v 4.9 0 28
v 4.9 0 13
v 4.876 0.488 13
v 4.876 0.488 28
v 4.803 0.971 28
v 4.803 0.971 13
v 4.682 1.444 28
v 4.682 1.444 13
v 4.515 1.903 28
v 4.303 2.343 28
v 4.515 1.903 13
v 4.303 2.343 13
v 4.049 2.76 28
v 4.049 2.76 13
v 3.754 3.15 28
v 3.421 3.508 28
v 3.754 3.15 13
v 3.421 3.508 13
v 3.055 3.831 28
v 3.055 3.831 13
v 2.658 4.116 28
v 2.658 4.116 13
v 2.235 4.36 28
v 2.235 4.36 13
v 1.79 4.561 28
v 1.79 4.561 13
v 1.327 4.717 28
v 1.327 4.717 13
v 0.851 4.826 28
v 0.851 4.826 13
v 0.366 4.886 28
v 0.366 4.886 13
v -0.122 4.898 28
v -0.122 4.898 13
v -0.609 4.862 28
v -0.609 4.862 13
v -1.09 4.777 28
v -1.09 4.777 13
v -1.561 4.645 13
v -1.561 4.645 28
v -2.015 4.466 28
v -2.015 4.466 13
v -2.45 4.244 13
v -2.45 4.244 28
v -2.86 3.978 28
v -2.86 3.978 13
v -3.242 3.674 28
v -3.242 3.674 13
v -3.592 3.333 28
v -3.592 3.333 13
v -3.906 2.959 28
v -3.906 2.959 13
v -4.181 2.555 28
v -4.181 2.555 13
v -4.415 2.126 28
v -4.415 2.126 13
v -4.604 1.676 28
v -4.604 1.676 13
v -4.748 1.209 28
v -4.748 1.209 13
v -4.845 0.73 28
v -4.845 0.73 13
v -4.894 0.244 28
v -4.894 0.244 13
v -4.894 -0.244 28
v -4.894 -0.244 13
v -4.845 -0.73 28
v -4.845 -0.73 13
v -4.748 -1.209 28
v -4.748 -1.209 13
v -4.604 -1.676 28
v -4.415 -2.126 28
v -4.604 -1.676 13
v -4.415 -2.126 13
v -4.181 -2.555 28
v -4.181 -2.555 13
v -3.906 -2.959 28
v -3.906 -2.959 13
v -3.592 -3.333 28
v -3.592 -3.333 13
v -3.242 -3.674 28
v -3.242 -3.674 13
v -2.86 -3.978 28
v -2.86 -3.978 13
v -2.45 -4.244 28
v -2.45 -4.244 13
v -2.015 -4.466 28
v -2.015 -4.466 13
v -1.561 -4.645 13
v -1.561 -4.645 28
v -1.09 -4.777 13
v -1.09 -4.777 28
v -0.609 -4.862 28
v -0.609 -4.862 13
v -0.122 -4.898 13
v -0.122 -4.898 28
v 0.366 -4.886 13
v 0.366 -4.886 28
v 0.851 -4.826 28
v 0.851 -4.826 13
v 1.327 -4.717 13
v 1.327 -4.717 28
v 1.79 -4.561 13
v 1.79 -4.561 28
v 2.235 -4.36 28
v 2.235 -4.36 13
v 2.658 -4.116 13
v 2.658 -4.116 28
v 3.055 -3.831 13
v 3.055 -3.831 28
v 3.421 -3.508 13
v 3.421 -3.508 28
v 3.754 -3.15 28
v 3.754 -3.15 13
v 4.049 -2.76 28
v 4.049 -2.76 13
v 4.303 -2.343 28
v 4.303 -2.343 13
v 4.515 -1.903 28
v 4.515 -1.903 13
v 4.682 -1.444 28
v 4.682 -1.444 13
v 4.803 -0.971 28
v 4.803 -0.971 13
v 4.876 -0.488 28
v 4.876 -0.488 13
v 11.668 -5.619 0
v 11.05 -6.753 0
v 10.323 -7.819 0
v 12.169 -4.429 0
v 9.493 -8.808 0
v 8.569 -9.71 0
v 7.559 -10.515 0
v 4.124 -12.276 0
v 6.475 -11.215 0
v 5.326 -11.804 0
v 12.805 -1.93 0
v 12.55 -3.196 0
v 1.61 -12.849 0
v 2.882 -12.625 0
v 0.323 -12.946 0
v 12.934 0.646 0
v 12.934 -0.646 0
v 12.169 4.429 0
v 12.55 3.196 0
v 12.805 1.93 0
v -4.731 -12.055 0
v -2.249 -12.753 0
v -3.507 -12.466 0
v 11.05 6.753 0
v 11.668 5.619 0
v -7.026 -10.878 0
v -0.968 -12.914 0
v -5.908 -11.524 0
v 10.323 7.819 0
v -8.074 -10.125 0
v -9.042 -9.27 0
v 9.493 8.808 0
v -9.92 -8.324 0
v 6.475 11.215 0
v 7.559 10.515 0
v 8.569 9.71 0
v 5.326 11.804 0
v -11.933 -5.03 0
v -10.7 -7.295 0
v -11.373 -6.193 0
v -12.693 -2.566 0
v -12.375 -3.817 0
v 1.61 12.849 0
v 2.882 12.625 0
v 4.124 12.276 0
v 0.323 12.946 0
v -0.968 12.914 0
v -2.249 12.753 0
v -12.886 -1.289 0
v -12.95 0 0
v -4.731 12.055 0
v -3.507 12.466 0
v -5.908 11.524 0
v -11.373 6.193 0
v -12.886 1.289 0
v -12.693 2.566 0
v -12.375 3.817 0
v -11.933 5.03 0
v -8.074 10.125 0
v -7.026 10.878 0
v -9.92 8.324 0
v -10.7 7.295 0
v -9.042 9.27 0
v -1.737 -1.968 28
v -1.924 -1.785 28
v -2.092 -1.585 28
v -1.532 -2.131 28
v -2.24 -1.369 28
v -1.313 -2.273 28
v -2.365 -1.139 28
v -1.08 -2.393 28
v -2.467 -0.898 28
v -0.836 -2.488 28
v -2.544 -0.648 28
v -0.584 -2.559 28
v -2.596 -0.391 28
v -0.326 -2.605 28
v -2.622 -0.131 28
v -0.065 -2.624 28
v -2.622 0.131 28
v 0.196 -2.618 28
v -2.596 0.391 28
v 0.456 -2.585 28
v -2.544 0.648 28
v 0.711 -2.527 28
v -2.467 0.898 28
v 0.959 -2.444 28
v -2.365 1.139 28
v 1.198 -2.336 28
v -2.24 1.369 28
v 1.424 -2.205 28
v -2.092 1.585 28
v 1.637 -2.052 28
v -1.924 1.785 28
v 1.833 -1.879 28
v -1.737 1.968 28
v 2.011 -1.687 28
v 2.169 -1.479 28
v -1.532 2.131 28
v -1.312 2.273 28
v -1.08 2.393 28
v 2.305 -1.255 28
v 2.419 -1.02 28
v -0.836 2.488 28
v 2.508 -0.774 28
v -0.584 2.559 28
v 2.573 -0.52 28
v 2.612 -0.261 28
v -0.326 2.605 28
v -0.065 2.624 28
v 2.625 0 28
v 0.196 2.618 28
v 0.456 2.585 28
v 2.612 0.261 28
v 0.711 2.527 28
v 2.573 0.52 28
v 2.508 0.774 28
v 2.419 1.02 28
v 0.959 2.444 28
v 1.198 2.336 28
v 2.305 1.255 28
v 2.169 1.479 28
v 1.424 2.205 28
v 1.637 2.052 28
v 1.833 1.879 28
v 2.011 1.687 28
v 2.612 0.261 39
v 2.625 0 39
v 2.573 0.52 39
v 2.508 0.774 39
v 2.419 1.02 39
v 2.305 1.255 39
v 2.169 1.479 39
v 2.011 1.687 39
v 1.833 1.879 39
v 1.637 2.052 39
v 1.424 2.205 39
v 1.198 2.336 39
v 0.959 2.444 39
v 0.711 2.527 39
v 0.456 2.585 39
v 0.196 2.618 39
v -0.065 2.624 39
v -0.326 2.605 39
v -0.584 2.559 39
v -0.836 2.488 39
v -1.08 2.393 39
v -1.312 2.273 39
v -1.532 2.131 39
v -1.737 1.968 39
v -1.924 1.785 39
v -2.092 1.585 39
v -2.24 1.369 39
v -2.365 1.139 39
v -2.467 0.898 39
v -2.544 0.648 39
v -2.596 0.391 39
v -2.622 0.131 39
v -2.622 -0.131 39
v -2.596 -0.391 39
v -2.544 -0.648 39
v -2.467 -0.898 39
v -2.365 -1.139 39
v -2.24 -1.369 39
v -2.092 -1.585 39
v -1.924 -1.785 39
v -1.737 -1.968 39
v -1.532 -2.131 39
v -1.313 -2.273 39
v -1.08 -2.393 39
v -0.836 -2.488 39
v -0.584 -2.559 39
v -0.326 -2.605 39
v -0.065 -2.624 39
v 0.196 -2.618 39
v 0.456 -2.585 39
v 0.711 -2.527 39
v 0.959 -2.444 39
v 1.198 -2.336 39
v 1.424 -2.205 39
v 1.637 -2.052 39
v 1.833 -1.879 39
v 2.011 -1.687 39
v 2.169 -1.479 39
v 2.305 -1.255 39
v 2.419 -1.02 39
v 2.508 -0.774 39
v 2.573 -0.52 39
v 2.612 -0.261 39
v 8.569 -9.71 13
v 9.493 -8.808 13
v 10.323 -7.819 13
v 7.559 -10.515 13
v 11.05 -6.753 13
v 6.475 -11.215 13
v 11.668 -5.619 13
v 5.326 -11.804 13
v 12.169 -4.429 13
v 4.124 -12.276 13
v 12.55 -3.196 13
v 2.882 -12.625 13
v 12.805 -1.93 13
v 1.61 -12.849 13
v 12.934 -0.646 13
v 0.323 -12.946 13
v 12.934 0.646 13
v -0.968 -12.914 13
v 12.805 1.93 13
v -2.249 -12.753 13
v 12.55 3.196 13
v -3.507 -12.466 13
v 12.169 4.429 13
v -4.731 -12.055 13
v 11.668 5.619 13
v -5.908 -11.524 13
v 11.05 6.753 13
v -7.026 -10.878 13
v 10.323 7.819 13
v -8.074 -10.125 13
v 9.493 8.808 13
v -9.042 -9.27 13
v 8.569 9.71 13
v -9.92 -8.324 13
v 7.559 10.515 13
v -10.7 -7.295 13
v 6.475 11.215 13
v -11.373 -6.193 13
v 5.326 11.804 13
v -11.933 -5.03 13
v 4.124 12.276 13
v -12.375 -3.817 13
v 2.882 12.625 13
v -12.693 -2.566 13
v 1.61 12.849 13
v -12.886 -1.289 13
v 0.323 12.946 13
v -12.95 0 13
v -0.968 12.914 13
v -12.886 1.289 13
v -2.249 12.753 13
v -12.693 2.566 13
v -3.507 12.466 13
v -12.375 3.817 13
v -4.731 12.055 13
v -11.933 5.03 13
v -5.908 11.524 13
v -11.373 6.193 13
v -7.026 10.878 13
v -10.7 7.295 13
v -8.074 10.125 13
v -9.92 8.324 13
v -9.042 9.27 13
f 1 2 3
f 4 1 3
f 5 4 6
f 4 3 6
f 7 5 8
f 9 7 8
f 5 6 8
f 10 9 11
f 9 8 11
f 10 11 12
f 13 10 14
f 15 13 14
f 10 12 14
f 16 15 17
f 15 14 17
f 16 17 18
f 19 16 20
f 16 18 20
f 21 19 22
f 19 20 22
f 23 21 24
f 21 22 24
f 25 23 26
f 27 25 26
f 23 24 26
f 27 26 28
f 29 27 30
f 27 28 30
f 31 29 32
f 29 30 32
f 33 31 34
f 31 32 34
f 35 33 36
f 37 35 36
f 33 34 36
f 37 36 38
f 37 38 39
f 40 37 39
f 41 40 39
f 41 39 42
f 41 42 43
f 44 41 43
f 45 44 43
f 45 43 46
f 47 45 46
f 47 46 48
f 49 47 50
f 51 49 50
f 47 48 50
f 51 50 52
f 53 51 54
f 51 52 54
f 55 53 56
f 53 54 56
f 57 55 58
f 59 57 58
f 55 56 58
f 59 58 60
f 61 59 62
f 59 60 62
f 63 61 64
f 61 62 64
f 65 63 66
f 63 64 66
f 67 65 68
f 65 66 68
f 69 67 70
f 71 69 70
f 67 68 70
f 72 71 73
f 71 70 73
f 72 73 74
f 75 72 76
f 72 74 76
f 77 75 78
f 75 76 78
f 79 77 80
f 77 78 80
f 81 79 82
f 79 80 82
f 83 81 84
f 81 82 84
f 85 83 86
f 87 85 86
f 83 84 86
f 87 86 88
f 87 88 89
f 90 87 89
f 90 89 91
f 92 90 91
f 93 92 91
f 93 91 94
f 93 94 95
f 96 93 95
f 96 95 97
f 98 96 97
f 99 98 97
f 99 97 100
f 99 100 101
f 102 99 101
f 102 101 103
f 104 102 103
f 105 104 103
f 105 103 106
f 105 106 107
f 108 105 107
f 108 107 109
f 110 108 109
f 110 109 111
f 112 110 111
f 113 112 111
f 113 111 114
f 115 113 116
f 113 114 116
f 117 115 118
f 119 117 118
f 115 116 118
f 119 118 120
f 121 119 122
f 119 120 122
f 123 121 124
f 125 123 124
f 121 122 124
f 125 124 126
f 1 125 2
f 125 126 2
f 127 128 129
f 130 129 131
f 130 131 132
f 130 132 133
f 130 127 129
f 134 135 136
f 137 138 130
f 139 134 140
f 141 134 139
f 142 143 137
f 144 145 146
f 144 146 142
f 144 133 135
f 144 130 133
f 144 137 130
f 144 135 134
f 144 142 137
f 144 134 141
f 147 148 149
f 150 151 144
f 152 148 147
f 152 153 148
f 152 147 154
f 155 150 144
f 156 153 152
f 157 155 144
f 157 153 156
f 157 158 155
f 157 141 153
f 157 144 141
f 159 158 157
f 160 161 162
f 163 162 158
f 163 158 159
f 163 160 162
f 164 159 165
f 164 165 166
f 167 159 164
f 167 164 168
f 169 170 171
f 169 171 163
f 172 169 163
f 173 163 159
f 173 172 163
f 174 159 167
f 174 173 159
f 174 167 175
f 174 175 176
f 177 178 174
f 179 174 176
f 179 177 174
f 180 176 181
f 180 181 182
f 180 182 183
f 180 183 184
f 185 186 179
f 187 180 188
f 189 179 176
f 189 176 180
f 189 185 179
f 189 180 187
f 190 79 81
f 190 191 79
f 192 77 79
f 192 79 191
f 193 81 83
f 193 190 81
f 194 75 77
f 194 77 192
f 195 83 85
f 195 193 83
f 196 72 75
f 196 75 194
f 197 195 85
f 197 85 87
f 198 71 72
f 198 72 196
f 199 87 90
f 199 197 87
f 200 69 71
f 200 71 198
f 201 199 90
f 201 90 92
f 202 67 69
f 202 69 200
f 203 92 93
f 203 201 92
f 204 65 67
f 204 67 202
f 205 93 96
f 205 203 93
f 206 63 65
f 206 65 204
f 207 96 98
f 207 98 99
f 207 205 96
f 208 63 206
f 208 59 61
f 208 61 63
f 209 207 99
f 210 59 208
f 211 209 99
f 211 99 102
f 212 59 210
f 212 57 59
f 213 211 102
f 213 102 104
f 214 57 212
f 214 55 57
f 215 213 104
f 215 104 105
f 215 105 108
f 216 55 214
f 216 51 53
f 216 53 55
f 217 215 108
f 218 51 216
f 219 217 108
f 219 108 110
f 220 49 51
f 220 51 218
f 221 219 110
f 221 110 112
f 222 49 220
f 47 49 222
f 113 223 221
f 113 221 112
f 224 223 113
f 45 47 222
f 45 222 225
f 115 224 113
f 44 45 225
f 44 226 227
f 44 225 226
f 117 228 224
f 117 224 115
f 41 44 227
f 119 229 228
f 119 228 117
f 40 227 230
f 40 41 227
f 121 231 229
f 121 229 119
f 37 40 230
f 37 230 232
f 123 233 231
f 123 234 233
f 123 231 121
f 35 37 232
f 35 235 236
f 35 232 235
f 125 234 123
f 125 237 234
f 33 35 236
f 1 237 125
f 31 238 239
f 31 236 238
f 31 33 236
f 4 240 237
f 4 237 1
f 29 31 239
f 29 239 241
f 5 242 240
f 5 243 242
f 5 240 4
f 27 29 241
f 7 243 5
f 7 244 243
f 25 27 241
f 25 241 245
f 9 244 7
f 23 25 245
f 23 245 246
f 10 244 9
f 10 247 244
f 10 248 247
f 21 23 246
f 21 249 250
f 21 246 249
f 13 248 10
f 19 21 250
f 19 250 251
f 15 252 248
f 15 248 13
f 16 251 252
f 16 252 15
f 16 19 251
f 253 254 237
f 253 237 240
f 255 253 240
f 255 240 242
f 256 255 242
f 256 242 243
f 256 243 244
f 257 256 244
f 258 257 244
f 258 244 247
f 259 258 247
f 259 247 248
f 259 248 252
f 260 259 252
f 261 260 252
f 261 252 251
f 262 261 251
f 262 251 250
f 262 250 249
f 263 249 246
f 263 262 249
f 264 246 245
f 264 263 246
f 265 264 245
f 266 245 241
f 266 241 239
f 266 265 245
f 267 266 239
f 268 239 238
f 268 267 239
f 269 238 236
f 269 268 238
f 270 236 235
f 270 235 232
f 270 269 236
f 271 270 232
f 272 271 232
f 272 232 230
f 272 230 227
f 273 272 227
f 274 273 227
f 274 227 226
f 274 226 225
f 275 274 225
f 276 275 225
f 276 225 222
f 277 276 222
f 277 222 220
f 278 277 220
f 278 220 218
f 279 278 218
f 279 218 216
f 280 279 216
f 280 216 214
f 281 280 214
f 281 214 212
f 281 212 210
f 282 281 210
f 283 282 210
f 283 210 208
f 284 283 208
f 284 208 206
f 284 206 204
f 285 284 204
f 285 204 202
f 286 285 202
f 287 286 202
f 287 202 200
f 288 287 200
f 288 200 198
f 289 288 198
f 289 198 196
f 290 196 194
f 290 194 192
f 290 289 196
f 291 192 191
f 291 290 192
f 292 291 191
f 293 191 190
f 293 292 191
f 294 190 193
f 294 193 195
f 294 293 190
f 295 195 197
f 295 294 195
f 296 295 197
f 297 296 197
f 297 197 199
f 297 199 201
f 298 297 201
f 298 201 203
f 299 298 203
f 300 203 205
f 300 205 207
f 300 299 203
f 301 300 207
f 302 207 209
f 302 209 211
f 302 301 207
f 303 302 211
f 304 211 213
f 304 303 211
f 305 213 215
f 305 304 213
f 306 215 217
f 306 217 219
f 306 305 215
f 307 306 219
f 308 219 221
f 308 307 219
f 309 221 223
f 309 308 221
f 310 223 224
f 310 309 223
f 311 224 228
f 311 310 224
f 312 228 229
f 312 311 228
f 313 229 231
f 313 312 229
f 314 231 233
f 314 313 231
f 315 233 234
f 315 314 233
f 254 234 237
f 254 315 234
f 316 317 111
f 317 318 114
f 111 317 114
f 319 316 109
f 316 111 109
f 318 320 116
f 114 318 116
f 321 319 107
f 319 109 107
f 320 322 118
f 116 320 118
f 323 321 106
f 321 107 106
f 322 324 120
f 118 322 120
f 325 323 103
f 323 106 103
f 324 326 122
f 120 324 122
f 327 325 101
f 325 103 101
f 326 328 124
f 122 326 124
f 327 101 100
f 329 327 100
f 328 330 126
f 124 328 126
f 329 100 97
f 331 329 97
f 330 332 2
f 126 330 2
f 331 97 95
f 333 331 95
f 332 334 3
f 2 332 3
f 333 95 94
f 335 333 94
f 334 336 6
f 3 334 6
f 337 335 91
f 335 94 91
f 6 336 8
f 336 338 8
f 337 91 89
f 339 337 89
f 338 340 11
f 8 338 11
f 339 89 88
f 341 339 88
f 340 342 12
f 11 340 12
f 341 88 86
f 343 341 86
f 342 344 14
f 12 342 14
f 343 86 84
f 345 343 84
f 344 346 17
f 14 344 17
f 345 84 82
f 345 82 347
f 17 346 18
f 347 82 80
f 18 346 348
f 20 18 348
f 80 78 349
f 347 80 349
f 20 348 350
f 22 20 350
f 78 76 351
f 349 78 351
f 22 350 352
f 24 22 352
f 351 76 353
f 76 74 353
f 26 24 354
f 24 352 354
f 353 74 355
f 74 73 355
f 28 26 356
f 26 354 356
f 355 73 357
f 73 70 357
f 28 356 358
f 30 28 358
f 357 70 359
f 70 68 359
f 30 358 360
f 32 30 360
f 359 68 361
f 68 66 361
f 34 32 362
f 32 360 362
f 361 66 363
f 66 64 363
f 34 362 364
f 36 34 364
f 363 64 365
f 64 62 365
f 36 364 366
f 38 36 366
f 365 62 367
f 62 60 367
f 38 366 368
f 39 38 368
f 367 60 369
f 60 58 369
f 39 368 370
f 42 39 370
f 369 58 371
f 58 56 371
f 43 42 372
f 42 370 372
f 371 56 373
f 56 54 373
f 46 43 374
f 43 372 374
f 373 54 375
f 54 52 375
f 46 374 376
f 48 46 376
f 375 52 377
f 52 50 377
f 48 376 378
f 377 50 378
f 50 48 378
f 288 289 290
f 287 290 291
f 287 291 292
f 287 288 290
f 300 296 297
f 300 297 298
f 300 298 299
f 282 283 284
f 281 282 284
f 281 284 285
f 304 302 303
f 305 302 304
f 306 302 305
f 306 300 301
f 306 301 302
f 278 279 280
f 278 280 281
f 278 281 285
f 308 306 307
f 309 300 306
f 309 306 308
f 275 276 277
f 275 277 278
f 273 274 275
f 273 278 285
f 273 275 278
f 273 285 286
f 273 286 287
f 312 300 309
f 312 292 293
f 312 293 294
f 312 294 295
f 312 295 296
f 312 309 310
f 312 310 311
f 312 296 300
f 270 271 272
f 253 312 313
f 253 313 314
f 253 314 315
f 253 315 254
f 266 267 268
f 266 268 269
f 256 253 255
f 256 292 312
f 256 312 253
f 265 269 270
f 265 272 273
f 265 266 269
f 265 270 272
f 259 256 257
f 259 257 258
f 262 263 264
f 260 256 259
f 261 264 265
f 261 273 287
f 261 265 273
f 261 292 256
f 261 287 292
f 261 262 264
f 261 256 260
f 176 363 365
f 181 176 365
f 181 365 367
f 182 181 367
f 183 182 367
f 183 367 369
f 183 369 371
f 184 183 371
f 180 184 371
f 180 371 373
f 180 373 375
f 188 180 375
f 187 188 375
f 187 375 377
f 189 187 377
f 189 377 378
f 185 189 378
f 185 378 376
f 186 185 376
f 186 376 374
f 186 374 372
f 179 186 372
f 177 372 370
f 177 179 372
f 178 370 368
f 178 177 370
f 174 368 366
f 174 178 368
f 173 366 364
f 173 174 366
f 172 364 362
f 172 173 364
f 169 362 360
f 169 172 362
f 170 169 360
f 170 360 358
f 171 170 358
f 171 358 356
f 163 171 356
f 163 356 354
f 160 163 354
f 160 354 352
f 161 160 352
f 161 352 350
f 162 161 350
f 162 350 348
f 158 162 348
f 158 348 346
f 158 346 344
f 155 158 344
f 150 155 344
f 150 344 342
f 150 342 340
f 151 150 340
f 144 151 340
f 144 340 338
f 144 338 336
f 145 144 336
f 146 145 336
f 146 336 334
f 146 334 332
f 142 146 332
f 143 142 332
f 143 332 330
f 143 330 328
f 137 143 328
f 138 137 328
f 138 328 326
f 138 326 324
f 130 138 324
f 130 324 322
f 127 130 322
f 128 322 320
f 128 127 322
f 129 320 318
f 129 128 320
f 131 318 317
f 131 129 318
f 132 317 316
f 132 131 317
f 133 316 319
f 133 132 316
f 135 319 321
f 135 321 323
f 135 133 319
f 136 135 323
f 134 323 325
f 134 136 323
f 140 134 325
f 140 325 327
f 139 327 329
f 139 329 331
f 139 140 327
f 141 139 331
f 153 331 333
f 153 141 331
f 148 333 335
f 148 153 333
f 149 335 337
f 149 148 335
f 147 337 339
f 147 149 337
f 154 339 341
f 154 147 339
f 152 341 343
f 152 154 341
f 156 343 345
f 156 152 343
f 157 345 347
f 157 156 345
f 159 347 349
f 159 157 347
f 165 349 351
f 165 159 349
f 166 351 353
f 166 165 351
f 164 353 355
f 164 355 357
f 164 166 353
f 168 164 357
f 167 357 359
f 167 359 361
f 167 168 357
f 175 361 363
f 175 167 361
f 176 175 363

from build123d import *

# Parameters (mm, degrees)
SKETCH2_R           = 12.5
BOSS_EXTRUDE1_DEPTH = 13
SKETCH3_R           = 2.45
BOSS_EXTRUDE2_DEPTH = 26
SKETCH4_R           = 12.9
BOSS_EXTRUDE3_DEPTH = 13
SKETCH5_R           = 2.625
BOSS_EXTRUDE4_DEPTH = 26
SKETCH6_R           = 4.9
BOSS_EXTRUDE5_DEPTH = 15
SKETCH7_R           = 13.125
BOSS_EXTRUDE6_DEPTH = 13
SKETCH8_R           = 13.125
SKETCH8_R_2         = 12.95
CUT_EXTRUDE1_DEPTH  = 44.191796096


with BuildPart() as part:
    # Sketch2 → Boss-Extrude1 (new body)
    with BuildSketch(Plane.XY):
        with Locations(Location((0, 0, 0), (0, 0, 180))):
            Circle(SKETCH2_R)
    extrude(amount=BOSS_EXTRUDE1_DEPTH)

    # Sketch3 → Boss-Extrude2 (add)
    with BuildSketch(Plane.XY.offset(13)):
        with Locations(Location((0, 0, 0), (0, 0, 180))):
            Circle(SKETCH3_R)
    extrude(amount=BOSS_EXTRUDE2_DEPTH)

    # Sketch4 → Boss-Extrude3 (add)
    with BuildSketch(Plane(origin=(0, 0, 0), x_dir=(-1, 0, 0), z_dir=(0, 0, -1))):
        Circle(SKETCH4_R)
    extrude(amount=-BOSS_EXTRUDE3_DEPTH)

    # Sketch5 → Boss-Extrude4 (add)
    with BuildSketch(Plane.XY.offset(39)):
        Circle(SKETCH5_R)
    extrude(amount=-BOSS_EXTRUDE4_DEPTH)

    # Sketch6 → Boss-Extrude5 (add)
    with BuildSketch(Plane.XY.offset(13)):
        Circle(SKETCH6_R)
    extrude(amount=BOSS_EXTRUDE5_DEPTH)

    # Sketch7 → Boss-Extrude6 (add)
    with BuildSketch(Plane(origin=(0, 0, 0), x_dir=(-1, 0, 0), z_dir=(0, 0, -1))):
        Circle(SKETCH7_R)
    extrude(amount=-BOSS_EXTRUDE6_DEPTH)

    # Sketch8 → Cut-Extrude1 (cut, through all)
    with BuildSketch(Plane(origin=(0, 0, 0), x_dir=(-1, 0, 0), z_dir=(0, 0, -1))):
        Circle(SKETCH8_R)
        Circle(SKETCH8_R_2, mode=Mode.SUBTRACT)
    extrude(amount=-CUT_EXTRUDE1_DEPTH, mode=Mode.SUBTRACT)


solid = part.part
